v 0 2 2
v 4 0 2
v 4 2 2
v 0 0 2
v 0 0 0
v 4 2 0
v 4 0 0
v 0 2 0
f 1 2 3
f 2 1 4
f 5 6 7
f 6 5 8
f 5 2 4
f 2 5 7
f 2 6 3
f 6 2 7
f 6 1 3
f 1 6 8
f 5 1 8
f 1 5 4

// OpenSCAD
// SYMPTOM: resize() left the un-resized SOURCE child as a stray orphan document
//   root, so the source and the resized result both survived and the summed
//   solids double-counted. With a large source extent the leak dominated the
//   total: corpus t3d__resize-tests blew up by ~4e9 % and t2d__resize-2d-tests
//   by ~40650 %. Minimal: resize([4,0,0]) cube([2,2,2]) imported as TWO roots,
//   the correct Matrix_Deformation (vol 16) AND a leaked raw cube (vol 8).
// CAUSE: importCSG.p_resize_action bakes the resized shape into a new
//   Part::FeaturePython ("Matrix Deformation") via transformGeometry, but only
//   p[6][0].ViewObject.hide()'d the source child -- and only under `gui`.
//   Headless (the importer's default) never consumed the source, leaving it as
//   an orphan root. Same orphan-leak class as the multmatrix fix (ac08e5e2c5),
//   which did not touch resize's separate transform block.
// FIX: importCSG.py p_resize_action -> after baking new_part.Shape, remove
//   p[6][0] and its subtree (OutListRecursive) from the document; its geometry
//   is fully copied into new_part and nothing else references it. Commit
//   2ff186a00a.
// EXPECTED (OpenSCAD): resize([4,0,0]) scales X from 2 to 4 and leaves Y,Z at 2
//   (a 0 newsize component means "leave that axis unchanged"), giving exactly
//   ONE solid of volume 4*2*2 = 16 -- no leftover 8-unit raw cube.
resize([4, 0, 0])
	cube([2, 2, 2]);
